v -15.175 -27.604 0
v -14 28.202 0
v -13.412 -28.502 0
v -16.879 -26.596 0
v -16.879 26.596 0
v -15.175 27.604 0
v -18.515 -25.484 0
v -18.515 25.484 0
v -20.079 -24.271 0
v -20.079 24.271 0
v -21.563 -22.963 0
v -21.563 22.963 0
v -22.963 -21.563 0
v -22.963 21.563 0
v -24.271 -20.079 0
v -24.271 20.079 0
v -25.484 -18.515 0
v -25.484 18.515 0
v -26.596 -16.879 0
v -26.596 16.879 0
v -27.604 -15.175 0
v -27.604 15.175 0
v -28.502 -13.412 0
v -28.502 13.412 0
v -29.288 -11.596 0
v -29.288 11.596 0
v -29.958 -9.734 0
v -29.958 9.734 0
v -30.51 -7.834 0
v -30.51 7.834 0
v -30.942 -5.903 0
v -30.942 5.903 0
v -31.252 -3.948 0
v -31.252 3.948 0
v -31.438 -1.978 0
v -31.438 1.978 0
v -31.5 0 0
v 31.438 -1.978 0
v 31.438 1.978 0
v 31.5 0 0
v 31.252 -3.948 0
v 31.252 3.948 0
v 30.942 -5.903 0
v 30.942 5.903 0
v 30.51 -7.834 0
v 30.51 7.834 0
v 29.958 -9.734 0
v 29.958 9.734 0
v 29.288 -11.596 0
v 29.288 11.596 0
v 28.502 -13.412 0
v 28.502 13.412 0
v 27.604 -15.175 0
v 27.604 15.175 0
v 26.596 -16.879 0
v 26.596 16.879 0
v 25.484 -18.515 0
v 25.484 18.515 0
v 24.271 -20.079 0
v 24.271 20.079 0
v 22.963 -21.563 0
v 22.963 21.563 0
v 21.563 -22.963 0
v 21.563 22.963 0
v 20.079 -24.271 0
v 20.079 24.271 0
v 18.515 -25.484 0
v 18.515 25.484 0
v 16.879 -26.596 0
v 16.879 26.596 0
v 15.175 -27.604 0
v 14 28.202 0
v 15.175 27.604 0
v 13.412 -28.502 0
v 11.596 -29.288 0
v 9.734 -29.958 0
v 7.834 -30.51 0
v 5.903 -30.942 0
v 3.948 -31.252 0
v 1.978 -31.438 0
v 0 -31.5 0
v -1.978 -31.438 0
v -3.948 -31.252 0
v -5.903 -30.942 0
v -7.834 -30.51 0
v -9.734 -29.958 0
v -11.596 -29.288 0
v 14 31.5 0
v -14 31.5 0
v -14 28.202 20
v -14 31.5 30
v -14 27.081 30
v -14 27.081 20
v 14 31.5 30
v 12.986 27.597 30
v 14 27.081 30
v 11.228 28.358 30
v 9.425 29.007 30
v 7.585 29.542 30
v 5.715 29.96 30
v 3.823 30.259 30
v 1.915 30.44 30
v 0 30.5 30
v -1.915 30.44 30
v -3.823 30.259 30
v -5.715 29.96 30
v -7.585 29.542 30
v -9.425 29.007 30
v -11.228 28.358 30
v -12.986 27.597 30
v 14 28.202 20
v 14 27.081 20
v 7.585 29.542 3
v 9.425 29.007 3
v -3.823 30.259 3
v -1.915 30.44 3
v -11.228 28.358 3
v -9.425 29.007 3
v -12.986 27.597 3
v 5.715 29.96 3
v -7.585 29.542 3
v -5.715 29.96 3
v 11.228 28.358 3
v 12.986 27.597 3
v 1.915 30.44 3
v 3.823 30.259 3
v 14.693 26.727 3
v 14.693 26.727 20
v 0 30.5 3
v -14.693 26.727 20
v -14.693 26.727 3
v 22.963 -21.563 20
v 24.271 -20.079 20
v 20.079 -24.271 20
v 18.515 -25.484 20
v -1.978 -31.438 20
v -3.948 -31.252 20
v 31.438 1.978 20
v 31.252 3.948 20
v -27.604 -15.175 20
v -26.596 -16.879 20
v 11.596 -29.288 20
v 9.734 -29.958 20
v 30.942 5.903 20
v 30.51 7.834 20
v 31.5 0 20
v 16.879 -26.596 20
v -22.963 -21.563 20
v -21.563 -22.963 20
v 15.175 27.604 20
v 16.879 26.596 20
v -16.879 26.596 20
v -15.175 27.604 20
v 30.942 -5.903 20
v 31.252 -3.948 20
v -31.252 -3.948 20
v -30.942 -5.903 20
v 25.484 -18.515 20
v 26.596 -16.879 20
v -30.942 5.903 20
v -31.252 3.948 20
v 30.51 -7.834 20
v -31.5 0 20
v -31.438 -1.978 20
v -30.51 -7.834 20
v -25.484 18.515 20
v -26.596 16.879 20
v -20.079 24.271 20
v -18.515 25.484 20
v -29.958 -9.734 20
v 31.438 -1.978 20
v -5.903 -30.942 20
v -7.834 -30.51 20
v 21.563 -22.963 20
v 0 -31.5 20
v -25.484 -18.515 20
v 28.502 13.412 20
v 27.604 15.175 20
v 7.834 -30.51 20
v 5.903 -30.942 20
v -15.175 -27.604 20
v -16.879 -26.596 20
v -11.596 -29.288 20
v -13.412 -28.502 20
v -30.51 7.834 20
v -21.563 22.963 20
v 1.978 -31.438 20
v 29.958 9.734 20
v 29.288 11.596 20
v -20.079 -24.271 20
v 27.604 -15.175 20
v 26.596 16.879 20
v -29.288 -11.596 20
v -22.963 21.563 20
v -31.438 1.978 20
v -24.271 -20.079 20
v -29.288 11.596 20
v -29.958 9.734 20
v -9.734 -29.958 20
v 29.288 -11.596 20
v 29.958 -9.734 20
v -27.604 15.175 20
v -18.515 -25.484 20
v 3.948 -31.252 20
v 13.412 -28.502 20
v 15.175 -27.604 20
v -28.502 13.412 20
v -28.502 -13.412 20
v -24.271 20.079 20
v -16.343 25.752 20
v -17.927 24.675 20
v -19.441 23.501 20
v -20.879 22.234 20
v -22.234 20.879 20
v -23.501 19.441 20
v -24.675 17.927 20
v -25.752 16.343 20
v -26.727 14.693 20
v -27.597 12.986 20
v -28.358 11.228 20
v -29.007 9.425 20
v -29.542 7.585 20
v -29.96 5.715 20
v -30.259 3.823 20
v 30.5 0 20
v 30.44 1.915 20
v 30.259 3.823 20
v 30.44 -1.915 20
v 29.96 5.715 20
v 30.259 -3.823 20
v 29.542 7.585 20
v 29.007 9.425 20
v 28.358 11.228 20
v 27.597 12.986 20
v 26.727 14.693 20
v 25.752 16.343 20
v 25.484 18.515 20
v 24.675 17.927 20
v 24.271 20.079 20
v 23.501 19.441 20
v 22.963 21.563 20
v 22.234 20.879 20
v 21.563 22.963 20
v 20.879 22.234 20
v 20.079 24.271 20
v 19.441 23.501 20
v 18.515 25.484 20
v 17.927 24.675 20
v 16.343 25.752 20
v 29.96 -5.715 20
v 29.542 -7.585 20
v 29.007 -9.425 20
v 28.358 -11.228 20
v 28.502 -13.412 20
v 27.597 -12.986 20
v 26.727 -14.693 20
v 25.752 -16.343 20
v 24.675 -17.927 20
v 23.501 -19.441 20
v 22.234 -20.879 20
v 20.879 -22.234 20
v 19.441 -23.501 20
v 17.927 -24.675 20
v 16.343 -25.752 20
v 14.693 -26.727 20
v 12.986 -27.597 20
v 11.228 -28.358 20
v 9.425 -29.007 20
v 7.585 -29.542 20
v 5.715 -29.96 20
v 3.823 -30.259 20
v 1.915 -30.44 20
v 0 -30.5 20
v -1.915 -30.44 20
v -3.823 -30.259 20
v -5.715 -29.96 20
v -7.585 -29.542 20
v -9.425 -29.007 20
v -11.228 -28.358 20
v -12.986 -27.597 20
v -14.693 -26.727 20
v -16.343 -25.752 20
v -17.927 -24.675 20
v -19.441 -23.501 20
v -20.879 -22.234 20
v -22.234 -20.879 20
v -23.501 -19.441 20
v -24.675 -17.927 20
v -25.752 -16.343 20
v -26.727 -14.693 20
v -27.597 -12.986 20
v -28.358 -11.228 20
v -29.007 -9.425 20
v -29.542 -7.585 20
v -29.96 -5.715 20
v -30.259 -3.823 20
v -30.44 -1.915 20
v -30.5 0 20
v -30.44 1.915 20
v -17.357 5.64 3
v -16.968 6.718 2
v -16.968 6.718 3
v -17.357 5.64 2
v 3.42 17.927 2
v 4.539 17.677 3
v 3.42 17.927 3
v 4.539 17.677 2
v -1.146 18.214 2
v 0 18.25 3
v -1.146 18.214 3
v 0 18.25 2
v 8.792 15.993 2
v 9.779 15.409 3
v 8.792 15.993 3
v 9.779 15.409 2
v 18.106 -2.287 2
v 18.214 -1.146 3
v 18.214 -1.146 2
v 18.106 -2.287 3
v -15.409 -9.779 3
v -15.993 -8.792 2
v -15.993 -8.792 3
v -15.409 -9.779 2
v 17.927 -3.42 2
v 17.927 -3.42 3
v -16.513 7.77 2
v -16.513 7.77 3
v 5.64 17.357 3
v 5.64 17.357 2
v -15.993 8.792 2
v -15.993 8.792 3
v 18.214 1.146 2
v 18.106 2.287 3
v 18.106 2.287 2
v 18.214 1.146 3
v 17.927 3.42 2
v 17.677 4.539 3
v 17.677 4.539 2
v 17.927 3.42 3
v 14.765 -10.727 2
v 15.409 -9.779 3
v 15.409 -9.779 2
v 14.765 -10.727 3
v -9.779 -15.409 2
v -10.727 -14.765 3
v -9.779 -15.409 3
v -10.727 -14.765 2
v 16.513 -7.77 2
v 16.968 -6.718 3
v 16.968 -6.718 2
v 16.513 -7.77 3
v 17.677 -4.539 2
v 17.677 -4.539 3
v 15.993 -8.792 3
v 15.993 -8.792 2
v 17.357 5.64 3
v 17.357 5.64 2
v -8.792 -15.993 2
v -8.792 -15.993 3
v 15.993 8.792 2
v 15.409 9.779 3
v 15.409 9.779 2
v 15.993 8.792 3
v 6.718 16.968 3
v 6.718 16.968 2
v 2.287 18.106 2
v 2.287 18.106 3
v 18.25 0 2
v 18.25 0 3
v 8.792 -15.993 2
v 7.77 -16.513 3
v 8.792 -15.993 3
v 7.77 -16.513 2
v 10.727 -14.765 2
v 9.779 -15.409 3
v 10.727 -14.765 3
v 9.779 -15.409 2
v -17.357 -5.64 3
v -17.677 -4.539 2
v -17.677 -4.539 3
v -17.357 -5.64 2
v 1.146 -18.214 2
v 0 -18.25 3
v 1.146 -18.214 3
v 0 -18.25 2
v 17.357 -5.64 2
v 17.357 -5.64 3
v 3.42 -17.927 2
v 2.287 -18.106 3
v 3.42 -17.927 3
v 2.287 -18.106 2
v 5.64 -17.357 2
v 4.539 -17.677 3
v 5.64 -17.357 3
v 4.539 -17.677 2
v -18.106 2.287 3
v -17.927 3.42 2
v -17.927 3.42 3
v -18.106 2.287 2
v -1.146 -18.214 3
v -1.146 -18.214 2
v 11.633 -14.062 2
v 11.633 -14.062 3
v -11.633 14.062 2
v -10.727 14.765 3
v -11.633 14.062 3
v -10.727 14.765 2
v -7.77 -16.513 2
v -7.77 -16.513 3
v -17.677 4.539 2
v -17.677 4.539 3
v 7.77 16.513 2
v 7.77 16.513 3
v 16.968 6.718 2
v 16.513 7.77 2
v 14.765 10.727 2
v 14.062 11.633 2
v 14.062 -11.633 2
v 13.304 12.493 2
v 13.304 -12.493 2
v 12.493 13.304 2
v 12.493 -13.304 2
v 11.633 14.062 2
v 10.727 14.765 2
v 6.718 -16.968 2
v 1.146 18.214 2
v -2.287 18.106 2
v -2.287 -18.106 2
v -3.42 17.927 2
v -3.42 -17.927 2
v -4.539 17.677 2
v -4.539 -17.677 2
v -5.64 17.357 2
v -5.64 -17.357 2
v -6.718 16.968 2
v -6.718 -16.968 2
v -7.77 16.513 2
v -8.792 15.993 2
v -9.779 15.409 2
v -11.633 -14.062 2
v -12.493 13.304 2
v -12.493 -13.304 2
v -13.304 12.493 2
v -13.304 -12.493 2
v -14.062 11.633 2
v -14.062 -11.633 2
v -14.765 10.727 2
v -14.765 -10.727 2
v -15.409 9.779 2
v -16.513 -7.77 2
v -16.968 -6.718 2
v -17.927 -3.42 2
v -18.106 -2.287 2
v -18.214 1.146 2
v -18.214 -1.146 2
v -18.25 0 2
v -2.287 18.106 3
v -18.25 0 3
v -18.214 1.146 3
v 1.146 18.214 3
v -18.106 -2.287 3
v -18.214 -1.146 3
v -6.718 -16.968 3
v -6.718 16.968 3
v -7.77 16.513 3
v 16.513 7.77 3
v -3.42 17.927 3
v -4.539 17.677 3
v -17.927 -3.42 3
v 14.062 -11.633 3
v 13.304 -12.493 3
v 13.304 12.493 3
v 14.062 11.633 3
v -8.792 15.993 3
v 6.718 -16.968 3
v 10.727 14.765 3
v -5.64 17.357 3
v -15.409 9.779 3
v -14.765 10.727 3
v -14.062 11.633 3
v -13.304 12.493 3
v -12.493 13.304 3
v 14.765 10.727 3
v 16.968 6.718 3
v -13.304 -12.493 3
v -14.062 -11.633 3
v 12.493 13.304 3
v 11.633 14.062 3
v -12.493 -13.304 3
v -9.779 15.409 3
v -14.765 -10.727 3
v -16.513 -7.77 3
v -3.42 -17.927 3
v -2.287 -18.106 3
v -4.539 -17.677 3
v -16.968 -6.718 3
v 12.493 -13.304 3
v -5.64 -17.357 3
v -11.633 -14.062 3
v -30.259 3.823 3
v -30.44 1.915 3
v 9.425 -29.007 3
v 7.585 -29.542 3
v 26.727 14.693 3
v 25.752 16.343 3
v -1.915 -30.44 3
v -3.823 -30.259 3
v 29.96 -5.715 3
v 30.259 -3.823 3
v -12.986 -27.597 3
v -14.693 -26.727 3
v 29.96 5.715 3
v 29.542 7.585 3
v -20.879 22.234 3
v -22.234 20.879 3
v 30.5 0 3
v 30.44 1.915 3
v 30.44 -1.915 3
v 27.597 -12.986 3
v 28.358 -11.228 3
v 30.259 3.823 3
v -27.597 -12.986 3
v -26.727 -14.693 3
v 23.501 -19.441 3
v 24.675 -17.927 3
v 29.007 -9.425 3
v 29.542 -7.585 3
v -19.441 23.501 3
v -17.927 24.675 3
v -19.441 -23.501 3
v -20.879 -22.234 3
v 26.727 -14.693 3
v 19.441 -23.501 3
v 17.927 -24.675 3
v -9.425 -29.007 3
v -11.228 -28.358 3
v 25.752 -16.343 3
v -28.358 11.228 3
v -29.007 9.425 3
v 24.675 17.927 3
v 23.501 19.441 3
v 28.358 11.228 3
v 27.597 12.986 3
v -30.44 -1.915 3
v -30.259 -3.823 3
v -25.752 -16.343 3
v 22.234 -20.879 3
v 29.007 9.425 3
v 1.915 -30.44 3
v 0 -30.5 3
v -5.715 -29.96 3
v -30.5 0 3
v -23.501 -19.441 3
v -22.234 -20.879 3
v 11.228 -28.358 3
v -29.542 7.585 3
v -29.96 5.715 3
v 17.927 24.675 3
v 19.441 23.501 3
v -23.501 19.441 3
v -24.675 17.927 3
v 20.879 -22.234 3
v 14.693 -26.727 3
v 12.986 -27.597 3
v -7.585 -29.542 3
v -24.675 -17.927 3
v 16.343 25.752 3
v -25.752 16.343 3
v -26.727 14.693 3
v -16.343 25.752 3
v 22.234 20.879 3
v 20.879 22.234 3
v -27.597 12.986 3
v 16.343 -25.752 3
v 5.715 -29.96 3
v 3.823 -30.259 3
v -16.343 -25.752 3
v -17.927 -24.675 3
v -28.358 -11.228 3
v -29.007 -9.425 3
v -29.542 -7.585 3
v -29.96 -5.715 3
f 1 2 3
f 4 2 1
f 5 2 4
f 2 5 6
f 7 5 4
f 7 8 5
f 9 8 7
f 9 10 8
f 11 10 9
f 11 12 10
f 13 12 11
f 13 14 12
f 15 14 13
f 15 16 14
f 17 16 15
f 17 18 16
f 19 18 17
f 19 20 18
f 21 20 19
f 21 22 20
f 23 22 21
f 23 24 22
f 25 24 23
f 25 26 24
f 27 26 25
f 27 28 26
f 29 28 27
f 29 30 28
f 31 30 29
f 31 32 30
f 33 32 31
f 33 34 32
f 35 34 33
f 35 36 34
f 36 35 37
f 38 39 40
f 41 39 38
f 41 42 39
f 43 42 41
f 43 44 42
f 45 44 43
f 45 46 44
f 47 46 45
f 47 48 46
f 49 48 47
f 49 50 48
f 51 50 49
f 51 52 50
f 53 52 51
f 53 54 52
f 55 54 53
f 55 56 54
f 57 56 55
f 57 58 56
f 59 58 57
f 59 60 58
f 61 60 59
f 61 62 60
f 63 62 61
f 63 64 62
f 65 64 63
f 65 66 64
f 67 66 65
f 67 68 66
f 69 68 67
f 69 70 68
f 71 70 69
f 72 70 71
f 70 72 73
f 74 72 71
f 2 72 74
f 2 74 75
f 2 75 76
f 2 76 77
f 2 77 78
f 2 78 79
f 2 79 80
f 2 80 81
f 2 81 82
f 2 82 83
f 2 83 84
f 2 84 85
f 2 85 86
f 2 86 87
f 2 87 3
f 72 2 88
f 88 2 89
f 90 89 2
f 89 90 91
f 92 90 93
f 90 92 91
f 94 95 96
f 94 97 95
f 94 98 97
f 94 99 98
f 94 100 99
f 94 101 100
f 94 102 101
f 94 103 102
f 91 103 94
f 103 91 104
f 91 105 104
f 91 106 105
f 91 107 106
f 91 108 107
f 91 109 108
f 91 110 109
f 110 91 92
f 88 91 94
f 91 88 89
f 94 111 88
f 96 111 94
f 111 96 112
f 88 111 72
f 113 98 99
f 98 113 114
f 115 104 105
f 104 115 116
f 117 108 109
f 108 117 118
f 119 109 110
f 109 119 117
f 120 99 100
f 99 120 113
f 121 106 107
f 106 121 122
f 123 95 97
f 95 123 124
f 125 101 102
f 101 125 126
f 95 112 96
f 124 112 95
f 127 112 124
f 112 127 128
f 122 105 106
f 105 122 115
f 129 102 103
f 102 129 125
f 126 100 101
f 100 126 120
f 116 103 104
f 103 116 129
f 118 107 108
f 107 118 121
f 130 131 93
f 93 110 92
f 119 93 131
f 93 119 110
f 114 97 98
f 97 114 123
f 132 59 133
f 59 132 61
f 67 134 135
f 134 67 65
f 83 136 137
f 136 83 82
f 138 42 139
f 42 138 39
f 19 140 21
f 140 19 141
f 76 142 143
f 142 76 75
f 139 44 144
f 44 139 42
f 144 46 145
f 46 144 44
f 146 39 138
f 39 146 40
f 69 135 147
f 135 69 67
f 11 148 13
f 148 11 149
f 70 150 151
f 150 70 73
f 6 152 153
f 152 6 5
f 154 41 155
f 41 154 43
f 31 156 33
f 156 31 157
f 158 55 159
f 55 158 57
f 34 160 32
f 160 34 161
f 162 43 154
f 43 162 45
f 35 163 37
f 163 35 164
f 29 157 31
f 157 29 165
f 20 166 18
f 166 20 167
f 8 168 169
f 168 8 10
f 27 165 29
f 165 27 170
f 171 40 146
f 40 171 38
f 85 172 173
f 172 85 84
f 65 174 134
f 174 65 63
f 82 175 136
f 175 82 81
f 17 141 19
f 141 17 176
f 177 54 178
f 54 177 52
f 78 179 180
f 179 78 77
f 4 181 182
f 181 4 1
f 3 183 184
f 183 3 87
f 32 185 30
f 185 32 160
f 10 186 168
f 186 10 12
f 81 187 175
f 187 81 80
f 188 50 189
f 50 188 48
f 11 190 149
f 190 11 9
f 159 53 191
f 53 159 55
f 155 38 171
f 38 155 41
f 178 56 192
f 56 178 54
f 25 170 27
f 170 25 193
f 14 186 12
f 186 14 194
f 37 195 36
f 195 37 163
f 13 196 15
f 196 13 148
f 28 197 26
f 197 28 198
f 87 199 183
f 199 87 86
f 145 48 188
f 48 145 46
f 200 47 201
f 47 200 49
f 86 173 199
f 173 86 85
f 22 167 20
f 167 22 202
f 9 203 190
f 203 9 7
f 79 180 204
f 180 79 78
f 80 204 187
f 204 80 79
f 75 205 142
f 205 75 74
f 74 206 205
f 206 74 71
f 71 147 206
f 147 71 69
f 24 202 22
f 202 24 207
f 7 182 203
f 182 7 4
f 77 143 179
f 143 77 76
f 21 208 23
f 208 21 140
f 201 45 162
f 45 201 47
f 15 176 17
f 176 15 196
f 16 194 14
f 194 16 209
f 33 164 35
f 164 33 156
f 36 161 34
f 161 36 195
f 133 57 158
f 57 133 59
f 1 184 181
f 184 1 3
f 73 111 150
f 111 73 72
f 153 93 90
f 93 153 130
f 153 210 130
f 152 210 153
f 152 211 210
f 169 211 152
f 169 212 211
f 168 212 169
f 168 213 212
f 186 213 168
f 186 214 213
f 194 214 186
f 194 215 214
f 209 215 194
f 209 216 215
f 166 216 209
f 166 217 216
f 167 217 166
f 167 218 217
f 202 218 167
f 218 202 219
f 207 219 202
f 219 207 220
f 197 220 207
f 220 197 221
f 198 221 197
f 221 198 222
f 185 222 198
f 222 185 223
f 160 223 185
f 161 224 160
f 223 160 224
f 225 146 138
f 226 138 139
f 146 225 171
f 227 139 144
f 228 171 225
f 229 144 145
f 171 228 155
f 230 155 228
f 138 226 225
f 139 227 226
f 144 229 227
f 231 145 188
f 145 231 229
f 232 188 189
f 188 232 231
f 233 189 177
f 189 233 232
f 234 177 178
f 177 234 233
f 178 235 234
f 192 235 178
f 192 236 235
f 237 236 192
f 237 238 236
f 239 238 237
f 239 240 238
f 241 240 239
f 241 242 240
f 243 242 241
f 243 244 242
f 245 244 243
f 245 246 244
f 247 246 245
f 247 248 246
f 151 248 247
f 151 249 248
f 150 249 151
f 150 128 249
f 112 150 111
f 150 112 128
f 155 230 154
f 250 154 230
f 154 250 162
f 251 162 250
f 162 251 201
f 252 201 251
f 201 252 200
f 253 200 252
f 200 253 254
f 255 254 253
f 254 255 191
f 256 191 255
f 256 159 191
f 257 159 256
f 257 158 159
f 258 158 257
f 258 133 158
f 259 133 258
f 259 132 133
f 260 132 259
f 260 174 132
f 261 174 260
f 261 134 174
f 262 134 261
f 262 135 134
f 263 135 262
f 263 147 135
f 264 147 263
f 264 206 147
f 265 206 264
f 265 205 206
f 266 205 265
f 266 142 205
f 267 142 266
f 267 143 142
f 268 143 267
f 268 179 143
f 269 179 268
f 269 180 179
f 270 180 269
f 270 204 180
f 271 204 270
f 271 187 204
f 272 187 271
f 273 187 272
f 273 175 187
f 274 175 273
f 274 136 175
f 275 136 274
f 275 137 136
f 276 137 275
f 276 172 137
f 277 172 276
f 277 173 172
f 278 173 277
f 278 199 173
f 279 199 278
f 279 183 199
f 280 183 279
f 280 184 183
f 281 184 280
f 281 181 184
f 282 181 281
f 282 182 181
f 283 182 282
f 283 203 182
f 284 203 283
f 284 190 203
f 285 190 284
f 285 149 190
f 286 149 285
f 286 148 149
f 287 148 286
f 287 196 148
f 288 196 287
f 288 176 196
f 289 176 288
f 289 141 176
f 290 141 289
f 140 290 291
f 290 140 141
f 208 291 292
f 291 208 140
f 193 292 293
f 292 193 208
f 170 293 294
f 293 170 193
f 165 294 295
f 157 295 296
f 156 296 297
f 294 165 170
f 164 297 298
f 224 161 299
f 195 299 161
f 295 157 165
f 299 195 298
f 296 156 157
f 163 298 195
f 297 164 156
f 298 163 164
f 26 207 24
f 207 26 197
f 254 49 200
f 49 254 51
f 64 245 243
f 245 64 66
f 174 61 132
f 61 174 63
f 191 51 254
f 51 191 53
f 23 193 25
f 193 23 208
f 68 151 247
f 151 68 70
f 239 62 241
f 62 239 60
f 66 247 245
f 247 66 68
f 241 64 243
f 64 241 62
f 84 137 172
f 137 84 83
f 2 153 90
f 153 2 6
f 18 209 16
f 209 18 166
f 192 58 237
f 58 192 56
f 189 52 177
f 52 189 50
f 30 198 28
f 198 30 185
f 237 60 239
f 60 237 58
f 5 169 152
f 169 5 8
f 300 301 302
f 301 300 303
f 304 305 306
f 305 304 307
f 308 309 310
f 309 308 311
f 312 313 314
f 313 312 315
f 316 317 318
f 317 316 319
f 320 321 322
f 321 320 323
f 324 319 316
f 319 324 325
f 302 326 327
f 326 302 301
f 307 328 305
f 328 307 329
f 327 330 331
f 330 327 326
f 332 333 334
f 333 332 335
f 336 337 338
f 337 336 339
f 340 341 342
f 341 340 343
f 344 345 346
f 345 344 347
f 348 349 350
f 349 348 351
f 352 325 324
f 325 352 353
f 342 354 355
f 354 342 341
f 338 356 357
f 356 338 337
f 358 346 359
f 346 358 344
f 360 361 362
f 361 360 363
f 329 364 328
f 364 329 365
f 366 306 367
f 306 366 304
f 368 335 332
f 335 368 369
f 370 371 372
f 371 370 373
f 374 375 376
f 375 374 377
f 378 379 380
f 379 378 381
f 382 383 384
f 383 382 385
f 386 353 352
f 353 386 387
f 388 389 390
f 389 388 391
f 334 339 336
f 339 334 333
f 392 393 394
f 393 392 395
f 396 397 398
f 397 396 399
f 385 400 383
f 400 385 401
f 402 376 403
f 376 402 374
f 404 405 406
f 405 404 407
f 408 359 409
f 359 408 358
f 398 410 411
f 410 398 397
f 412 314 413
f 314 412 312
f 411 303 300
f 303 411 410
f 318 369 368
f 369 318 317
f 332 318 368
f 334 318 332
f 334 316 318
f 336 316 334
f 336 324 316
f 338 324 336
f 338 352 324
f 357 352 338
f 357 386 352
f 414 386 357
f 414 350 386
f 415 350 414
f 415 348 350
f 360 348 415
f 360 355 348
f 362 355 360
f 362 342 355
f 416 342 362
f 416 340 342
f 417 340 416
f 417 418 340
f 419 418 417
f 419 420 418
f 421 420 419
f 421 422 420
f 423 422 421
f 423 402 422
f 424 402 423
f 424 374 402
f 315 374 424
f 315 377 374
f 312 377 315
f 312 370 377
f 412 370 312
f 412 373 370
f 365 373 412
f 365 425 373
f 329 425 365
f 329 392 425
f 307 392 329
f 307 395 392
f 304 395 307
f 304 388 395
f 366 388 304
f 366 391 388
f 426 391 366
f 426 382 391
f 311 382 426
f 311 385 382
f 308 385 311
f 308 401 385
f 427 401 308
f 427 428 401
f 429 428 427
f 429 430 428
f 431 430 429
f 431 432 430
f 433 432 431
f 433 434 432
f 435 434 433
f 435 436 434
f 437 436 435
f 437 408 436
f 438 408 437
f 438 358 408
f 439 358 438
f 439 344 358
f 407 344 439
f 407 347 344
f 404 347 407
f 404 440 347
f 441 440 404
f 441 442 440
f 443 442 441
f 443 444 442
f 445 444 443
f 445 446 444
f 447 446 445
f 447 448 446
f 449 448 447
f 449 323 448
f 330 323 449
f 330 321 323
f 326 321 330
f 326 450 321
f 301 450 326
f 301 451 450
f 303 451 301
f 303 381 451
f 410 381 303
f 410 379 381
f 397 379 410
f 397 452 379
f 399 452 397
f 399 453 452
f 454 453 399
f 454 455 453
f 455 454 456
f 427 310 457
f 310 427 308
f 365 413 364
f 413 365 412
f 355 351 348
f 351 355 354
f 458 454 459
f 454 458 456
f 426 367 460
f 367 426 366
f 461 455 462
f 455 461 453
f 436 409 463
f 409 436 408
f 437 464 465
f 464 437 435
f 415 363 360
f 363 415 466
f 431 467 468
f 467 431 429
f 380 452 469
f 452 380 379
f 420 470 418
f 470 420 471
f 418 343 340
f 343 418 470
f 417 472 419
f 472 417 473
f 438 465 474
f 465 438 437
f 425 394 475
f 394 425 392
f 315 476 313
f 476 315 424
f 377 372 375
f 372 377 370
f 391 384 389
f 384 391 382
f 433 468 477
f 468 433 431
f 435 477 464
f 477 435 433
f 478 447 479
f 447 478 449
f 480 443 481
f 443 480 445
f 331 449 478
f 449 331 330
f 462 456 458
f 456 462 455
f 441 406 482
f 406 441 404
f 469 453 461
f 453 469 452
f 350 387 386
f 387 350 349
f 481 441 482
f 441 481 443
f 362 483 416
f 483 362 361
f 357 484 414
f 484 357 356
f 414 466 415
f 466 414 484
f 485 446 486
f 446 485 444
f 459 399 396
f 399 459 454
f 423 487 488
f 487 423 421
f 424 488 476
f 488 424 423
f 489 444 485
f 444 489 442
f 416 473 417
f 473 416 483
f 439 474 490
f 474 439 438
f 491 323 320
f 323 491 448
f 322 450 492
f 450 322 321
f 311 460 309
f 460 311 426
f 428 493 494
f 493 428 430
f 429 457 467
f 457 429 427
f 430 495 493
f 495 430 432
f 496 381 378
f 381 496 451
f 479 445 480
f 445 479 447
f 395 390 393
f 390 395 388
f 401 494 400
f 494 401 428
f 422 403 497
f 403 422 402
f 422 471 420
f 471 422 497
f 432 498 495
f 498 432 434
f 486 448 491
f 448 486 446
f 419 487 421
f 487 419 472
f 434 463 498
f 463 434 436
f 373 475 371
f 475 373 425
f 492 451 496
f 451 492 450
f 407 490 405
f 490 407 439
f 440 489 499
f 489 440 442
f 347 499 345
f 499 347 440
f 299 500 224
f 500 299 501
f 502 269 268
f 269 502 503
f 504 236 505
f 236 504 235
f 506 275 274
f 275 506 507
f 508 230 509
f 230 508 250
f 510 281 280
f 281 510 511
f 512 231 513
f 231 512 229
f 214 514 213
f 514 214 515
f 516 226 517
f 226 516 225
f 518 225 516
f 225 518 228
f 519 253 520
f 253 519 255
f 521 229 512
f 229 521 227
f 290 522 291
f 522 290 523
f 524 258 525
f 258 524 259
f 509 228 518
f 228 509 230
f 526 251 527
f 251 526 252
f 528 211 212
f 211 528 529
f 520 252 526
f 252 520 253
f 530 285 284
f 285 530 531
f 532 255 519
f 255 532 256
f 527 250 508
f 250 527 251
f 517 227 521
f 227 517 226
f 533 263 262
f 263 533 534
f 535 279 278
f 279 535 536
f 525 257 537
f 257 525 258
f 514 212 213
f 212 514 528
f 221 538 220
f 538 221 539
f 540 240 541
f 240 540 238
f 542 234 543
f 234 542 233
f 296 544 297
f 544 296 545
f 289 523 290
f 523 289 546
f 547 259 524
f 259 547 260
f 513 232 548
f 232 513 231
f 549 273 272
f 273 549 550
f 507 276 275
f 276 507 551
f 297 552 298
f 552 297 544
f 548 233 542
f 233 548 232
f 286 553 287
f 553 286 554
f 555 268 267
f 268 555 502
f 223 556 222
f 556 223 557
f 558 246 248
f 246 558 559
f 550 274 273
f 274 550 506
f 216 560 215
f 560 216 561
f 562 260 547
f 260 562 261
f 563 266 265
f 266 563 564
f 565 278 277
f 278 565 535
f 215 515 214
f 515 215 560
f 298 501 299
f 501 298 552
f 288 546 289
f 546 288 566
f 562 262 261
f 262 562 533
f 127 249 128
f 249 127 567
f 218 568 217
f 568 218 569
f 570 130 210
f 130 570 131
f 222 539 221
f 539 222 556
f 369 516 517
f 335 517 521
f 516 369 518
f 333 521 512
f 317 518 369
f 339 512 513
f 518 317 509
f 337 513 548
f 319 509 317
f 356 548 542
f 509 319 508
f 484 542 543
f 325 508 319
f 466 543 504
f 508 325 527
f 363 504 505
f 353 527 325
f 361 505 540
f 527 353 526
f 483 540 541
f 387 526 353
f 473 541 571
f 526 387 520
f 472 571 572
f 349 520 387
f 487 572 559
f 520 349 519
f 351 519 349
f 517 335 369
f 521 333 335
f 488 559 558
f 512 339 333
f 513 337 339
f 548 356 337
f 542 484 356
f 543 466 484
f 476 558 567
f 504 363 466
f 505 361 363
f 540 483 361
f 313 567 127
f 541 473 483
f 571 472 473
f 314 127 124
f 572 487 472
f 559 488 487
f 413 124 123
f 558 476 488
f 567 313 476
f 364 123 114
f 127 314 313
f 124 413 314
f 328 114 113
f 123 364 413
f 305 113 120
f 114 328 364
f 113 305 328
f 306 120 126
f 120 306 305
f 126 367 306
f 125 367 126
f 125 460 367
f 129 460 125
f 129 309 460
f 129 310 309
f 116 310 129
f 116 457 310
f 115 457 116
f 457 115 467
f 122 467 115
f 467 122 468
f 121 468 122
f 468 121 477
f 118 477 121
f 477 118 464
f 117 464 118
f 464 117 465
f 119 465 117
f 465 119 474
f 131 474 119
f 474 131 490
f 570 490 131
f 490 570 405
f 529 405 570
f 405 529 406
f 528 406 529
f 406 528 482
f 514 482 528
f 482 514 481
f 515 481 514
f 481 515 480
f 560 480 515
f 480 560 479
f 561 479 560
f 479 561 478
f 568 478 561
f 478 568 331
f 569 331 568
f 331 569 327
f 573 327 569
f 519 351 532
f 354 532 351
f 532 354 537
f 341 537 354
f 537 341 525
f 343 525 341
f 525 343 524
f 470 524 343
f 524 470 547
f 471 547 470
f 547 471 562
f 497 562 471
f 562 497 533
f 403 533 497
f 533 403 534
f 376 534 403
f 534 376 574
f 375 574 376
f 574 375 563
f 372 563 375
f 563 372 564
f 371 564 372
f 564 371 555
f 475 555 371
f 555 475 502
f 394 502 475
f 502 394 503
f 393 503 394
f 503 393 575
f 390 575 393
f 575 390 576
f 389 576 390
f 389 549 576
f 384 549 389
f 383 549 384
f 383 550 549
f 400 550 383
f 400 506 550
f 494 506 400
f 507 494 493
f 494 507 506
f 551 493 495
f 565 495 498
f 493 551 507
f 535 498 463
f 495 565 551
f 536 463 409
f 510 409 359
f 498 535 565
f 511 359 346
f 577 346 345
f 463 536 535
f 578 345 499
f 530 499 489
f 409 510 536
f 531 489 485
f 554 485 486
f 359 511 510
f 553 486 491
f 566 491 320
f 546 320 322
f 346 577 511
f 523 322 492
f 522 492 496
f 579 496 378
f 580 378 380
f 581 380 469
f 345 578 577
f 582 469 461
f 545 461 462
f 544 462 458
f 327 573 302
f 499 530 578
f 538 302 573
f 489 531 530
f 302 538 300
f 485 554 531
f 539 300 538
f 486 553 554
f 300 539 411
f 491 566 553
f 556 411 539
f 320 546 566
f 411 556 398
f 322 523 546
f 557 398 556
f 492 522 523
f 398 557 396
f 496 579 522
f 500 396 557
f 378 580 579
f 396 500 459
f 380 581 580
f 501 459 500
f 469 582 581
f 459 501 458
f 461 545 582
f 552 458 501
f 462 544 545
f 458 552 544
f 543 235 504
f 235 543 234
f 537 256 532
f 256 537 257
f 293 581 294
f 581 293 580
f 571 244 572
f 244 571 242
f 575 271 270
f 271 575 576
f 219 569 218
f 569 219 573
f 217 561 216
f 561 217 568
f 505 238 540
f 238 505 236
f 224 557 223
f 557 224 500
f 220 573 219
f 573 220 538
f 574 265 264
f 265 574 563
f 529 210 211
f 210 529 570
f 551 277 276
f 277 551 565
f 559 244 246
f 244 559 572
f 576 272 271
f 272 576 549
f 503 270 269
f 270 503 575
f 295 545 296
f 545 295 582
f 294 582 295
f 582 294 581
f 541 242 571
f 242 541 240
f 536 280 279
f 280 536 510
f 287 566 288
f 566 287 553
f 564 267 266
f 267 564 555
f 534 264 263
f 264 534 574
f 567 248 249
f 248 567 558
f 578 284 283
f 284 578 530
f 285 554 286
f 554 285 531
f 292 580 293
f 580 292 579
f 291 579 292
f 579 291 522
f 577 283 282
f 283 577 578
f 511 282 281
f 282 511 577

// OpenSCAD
$fn = 100;

module holder() {
    linear_extrude(2) {
        circle(d=61);
    }

    difference() {
        linear_extrude(20) {
            circle(d=63);
        }
        translate([0, 0, 2]) {
            linear_extrude(2) {
                circle(d=36.5);
            }
        }
        translate([0, 0, 3]) {
            linear_extrude(20) {
                circle(d=61);
            }
        }
    }
}

module mount() {
    difference() {
        translate([-14, 0, 0]) {
            linear_extrude(30) {
                square([28,31.5]);
            }
        }
        // translate([-20.5,0,20]) {
        //     linear_extrude(30.5) {
        //         square([41,62]);
        //     }
        // }
        linear_extrude(41) {
            circle(d=61);
        }
    }
}

mount();
holder();
